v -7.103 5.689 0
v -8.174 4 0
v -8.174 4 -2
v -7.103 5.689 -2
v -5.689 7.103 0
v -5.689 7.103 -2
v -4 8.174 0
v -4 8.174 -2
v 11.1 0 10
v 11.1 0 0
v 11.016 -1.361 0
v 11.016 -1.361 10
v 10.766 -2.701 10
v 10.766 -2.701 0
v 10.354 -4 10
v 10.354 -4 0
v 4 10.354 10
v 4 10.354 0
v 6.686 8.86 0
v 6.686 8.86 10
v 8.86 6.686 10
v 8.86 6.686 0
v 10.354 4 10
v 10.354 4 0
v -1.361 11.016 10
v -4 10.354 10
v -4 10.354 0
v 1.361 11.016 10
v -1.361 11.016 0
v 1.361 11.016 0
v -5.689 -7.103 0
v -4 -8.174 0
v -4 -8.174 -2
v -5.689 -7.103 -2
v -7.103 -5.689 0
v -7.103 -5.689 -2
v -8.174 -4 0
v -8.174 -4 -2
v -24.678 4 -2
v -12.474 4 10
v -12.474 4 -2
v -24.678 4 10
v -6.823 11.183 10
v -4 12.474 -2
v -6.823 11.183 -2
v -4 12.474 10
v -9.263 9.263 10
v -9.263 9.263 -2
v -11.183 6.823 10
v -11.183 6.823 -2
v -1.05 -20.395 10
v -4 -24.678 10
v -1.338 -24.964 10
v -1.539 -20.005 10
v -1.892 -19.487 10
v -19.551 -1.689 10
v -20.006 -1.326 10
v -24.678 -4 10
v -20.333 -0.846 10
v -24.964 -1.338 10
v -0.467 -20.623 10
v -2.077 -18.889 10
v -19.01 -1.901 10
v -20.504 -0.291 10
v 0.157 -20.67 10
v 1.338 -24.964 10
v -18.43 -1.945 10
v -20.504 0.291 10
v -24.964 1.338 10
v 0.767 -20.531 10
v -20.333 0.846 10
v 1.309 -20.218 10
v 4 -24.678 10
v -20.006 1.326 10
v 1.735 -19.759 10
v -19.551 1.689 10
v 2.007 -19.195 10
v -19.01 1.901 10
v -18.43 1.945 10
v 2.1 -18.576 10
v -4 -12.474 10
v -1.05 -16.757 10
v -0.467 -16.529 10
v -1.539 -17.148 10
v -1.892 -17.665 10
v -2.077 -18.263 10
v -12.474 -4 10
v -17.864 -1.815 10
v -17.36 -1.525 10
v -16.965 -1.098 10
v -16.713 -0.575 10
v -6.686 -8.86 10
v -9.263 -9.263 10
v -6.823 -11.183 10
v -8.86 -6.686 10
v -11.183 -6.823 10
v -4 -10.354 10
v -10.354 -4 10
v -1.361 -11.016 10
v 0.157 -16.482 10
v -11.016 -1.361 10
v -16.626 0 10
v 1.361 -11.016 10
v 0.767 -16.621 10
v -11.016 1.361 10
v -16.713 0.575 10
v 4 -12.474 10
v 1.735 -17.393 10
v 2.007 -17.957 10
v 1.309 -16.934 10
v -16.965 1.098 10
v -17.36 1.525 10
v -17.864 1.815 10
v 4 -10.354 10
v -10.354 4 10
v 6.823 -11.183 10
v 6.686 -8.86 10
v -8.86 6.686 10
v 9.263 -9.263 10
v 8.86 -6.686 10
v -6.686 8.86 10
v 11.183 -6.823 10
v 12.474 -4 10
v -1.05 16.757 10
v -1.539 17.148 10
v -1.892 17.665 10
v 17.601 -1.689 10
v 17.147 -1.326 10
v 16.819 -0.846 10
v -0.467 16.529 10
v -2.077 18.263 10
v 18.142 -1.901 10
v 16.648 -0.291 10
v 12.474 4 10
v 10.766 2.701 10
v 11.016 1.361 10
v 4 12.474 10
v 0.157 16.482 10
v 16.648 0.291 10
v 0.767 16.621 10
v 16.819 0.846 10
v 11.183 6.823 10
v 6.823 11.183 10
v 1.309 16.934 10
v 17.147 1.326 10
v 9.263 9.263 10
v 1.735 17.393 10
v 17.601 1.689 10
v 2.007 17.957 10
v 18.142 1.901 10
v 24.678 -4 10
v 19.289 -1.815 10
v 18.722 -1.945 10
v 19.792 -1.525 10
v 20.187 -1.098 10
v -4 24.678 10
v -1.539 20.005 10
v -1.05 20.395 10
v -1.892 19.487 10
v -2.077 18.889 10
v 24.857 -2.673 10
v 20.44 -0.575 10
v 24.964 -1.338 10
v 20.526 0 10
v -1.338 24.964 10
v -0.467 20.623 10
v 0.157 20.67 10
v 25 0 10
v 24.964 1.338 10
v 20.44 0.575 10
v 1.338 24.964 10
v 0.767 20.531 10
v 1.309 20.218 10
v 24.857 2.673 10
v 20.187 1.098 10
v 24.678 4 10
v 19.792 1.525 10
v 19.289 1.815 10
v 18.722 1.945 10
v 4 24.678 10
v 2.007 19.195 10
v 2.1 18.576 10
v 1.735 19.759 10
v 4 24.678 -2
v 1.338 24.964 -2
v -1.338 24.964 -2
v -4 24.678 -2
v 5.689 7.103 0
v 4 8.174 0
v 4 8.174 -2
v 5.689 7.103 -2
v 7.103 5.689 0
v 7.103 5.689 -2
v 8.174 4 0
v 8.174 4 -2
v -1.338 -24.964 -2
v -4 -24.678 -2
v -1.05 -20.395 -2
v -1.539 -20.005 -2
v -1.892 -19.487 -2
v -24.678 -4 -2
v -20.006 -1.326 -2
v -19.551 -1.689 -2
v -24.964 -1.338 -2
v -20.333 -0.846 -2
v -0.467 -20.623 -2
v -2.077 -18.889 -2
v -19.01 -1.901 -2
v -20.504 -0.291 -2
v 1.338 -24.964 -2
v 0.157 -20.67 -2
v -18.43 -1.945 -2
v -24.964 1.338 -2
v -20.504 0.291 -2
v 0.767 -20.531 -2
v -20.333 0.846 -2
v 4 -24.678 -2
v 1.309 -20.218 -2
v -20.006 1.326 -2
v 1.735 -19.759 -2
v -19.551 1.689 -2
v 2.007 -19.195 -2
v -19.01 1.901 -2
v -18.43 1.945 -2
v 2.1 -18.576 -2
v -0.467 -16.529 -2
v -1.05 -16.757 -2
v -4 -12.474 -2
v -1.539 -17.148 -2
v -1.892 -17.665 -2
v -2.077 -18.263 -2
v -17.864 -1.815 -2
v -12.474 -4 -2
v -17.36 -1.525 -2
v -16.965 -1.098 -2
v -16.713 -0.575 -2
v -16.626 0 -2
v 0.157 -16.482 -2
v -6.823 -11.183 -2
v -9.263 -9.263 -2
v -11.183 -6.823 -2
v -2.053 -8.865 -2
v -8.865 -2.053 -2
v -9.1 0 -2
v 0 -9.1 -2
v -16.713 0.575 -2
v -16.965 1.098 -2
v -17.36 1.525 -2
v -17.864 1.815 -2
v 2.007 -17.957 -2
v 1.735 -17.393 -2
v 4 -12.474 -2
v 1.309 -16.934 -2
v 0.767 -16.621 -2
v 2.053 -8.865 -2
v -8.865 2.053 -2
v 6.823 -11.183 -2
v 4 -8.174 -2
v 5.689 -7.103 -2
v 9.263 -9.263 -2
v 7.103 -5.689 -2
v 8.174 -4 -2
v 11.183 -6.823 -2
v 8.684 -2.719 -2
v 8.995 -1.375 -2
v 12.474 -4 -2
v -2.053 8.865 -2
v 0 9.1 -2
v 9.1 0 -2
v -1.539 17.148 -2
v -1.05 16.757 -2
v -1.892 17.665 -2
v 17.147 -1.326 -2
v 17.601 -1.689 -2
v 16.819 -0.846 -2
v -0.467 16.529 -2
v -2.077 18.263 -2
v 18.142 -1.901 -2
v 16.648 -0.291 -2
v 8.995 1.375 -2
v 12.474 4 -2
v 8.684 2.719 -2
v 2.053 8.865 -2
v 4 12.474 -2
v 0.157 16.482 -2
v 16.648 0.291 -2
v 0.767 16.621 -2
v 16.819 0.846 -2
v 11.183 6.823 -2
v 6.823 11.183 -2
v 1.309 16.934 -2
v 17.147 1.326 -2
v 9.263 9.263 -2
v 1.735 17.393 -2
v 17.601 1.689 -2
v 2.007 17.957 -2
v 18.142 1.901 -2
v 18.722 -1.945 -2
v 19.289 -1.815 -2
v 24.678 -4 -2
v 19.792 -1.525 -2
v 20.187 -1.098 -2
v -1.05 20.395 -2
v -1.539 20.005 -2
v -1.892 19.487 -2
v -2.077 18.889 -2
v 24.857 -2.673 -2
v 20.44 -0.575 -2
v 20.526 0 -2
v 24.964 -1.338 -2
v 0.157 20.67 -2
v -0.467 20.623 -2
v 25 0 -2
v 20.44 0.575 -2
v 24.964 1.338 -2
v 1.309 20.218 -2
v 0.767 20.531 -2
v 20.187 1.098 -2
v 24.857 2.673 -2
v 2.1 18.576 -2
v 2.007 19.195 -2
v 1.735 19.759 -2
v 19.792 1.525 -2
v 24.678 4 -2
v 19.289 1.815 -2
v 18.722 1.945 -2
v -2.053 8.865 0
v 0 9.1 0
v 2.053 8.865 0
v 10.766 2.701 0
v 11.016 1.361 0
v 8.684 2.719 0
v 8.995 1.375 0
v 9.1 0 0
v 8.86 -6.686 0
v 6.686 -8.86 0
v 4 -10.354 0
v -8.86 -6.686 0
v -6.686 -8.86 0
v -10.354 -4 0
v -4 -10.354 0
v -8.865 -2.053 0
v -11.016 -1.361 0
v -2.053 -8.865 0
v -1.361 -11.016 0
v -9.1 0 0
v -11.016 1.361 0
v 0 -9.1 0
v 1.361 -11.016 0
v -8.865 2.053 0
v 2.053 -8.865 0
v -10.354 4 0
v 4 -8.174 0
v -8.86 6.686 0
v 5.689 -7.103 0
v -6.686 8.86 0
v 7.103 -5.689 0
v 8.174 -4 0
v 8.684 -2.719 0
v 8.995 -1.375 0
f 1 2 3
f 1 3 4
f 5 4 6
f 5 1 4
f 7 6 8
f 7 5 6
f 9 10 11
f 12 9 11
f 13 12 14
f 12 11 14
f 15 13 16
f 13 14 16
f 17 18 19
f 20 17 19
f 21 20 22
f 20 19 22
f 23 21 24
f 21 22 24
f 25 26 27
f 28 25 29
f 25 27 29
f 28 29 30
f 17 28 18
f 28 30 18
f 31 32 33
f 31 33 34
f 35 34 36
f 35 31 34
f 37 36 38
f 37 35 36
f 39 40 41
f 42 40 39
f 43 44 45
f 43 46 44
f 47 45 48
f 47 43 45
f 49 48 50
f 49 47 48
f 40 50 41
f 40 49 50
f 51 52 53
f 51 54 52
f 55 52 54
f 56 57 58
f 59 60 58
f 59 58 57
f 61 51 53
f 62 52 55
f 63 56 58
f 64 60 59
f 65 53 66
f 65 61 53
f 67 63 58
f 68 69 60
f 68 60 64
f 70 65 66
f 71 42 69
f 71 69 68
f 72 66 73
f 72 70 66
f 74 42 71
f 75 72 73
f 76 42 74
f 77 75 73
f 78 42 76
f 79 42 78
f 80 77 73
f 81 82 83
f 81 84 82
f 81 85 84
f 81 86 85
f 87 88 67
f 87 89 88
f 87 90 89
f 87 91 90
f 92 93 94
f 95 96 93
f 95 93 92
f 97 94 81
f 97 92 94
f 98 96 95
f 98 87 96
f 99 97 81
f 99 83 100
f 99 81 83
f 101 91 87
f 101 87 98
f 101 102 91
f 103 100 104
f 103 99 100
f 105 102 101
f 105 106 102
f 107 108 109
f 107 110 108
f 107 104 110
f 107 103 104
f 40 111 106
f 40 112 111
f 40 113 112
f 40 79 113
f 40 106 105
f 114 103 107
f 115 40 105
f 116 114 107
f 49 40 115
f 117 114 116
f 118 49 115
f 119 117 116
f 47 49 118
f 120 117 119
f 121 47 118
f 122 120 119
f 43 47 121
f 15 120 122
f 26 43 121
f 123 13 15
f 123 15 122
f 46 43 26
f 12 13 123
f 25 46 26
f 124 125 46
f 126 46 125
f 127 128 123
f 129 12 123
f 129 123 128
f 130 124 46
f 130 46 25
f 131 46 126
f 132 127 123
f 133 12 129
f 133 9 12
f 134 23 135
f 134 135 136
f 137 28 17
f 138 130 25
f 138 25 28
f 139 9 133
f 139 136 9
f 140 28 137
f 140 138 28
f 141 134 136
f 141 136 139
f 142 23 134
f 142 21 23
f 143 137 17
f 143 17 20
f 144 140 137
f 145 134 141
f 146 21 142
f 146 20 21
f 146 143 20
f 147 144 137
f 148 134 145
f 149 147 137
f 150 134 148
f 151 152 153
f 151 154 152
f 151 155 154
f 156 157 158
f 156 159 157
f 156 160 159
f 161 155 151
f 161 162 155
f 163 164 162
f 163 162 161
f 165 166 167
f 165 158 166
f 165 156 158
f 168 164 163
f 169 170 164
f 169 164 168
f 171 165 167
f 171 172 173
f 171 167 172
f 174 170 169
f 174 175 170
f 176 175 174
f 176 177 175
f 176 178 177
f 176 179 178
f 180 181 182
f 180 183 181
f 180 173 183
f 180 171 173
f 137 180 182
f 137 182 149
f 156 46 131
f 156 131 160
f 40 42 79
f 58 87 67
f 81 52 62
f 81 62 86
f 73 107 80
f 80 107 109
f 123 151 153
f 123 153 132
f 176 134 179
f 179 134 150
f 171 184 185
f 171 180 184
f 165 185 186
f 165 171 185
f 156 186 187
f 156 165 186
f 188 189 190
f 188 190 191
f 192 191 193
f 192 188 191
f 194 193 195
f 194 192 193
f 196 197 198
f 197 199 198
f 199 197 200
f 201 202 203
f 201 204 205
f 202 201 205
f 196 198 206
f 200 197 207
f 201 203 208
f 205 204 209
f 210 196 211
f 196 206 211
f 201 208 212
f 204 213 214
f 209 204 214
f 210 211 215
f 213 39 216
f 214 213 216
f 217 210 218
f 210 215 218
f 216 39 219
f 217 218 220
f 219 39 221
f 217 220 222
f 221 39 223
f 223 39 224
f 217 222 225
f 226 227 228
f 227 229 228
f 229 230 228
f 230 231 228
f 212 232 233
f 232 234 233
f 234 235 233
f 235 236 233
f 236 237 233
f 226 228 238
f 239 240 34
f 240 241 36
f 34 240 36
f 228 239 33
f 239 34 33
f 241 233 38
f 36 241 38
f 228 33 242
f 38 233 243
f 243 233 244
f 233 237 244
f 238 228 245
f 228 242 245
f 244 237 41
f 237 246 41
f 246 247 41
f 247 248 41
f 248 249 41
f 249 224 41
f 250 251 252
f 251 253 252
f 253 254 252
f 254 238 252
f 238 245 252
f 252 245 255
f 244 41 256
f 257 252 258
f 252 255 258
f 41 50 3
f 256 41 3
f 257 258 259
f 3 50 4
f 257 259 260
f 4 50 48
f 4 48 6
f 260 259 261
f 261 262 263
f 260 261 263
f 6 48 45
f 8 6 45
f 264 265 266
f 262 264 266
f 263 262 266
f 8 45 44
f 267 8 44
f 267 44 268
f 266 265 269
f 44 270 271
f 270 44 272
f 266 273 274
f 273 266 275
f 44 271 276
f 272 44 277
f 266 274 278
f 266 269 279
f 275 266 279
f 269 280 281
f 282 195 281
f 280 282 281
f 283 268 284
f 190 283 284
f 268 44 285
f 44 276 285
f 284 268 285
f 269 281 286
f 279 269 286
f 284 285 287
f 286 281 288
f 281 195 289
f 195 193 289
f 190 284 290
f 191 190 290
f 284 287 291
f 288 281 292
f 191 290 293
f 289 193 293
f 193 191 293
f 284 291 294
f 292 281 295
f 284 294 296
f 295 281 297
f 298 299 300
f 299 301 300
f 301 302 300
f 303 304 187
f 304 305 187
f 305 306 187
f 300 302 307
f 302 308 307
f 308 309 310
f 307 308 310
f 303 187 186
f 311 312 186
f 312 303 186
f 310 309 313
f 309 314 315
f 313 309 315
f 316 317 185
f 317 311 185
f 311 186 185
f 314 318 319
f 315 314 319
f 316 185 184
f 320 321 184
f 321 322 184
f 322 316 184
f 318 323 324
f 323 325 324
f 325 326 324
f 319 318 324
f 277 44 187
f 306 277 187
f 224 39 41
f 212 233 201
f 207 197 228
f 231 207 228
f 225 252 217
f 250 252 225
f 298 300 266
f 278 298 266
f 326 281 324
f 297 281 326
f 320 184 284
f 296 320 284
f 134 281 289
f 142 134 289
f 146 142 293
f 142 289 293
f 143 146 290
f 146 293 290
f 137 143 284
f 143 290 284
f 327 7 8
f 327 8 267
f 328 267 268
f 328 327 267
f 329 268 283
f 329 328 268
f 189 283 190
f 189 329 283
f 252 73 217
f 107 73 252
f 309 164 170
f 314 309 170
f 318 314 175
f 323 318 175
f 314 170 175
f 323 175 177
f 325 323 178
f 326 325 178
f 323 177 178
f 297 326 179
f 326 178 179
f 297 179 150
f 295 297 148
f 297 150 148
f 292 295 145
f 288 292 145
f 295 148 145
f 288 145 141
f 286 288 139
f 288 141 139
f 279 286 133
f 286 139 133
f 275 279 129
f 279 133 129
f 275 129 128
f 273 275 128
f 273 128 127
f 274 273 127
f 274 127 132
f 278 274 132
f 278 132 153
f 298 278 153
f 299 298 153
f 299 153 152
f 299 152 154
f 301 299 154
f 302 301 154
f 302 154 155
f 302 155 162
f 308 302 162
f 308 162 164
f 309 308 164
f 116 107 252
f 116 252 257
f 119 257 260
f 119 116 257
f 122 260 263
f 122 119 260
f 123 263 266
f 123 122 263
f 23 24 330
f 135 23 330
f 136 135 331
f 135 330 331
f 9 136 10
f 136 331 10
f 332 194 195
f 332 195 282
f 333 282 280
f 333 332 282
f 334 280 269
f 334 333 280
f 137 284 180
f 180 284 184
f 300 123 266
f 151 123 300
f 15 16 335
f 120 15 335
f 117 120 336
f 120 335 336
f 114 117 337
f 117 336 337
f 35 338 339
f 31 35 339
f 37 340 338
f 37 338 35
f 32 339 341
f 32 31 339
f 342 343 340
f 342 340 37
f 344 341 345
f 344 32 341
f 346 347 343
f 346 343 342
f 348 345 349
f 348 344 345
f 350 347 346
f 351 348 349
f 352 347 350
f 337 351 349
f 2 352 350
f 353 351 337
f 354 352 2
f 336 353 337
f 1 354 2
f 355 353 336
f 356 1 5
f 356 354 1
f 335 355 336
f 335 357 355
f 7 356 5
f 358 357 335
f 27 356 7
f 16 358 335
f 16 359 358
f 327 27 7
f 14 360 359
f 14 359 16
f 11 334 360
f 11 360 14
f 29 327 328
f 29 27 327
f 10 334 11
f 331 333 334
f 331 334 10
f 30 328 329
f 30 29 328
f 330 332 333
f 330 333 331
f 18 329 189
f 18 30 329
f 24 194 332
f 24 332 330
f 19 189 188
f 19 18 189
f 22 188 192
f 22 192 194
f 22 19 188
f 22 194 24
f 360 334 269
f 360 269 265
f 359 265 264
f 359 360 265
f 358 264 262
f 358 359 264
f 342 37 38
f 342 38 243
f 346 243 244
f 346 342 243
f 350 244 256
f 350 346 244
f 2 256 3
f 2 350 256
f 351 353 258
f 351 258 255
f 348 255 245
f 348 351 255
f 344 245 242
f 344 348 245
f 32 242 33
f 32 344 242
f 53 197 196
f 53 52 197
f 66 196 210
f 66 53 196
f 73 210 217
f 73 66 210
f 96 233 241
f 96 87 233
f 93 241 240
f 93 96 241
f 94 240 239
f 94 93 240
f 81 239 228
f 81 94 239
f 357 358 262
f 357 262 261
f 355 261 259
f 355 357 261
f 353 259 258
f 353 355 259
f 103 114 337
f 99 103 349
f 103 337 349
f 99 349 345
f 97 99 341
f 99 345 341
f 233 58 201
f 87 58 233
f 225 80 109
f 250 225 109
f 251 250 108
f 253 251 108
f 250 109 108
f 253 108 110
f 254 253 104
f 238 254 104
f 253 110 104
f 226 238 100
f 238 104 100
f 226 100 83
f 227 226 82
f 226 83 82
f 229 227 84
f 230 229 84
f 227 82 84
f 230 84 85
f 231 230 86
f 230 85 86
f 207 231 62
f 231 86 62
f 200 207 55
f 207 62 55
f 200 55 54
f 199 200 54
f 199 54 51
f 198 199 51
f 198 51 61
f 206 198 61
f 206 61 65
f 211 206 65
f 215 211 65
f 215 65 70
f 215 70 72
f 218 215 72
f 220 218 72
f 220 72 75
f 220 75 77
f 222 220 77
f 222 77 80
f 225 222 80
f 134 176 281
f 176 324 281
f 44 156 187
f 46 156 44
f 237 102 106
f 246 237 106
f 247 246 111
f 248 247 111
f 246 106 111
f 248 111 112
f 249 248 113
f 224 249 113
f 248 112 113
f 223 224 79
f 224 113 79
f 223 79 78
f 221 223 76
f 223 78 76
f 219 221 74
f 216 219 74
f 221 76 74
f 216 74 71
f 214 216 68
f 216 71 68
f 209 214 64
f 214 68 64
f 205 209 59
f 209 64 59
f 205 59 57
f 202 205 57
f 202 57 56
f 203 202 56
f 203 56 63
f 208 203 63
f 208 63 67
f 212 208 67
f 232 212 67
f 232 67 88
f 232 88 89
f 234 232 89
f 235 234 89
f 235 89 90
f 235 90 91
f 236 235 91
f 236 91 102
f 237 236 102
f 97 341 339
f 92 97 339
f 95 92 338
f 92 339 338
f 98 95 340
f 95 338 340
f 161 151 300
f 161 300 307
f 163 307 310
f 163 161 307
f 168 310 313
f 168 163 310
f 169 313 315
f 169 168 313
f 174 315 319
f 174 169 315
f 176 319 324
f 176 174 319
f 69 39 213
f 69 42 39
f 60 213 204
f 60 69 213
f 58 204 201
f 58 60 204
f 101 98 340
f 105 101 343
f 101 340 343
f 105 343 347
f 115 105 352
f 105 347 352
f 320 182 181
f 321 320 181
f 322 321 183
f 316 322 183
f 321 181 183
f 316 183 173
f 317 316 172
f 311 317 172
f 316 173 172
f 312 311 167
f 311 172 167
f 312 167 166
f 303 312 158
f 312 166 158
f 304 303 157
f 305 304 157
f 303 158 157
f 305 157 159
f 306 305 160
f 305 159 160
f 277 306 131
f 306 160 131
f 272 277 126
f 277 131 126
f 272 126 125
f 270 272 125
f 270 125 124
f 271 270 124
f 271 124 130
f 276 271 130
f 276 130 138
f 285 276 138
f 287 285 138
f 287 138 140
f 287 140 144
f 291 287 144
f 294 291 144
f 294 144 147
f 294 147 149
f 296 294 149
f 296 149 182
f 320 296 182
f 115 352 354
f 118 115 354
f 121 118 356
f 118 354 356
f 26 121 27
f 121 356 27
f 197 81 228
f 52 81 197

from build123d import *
from build123d import SkipClean  # not in build123d's __all__

# Parameters (mm, degrees)
F1_DEPTH = 2
F2_DEPTH = 10
F3_R     = 1.95
F3_R_2   = 2.1
F4_DEPTH = 12.001


# Not quite as in the source:
# - after a boolean that leaves OpenCascade's solid faulty, fix() repairs it


with BuildPart() as f1:
    # F0 (on Top) → F1 (new body)
    with BuildSketch(Plane.XY):
        with BuildLine():
            ThreePointArc((-4, 12.4743737318), (0, 13.1), (4, 12.4743737318))
            Line((4, 12.4743737318), (4, 24.6779253585))
            Line((4, 24.6779253585), (-4, 24.6779253585))
            Line((-4, 24.6779253585), (-4, 12.4743737318))
        make_face()
        with BuildLine():
            Line((-4, 24.6779253585), (4, 24.6779253585))
            ThreePointArc((4, 24.6779253585), (0, 25), (-4, 24.6779253585))
        make_face()
        with BuildLine():
            ThreePointArc((25, 0), (24.9193512552, 2.0064727804), (24.6779253585, 4))
            Line((24.6779253585, 4), (24.6779253585, -4))
            ThreePointArc((24.6779253585, -4), (24.9193512552, -2.0064727804), (25, 0))
        make_face()
        with BuildLine():
            Line((24.6779253585, 4), (12.4743737318, 4))
            ThreePointArc((12.4743737318, 4), (12.942648413, 2.0243152069), (13.1, 0))
            ThreePointArc((13.1, 0), (12.942648413, -2.0243152069), (12.4743737318, -4))
            Line((12.4743737318, -4), (24.6779253585, -4))
            Line((24.6779253585, -4), (24.6779253585, 4))
        make_face()
        with BuildLine():
            ThreePointArc((-4, -24.6779253585), (0, -25), (4, -24.6779253585))
            Line((4, -24.6779253585), (-4, -24.6779253585))
        make_face()
        with BuildLine():
            Line((-24.6779253585, -4), (-24.6779253585, 4))
            ThreePointArc((-24.6779253585, 4), (-25, 0), (-24.6779253585, -4))
        make_face()
        with BuildLine():
            ThreePointArc((-12.4743737318, -4), (-13.1, 0), (-12.4743737318, 4))
            Line((-12.4743737318, 4), (-24.6779253585, 4))
            Line((-24.6779253585, 4), (-24.6779253585, -4))
            Line((-24.6779253585, -4), (-12.4743737318, -4))
        make_face()
        with BuildLine():
            Line((4, -24.6779253585), (4, -12.4743737318))
            ThreePointArc((4, -12.4743737318), (0, -13.1), (-4, -12.4743737318))
            Line((-4, -12.4743737318), (-4, -24.6779253585))
            Line((-4, -24.6779253585), (4, -24.6779253585))
        make_face()
        with BuildLine():
            Line((-4, -12.4743737318), (-4, -10.3542261903))
            ThreePointArc((-4, -10.3542261903), (-7.8488852712, -7.8488852712), (-10.3542261903, -4))
            Line((-10.3542261903, -4), (-12.4743737318, -4))
            ThreePointArc((-12.4743737318, -4), (-9.2630988335, -9.2630988335), (-4, -12.4743737318))
        make_face()
        with BuildLine():
            ThreePointArc((-10.3542261903, -4), (-7.8488852712, -7.8488852712), (-4, -10.3542261903))
            Line((-4, -10.3542261903), (-4, -8.1737384348))
            ThreePointArc((-4, -8.1737384348), (-6.4346717088, -6.4346717088), (-8.1737384348, -4))
            Line((-8.1737384348, -4), (-10.3542261903, -4))
        make_face()
        with BuildLine():
            Line((-8.1737384348, 4), (-10.3542261903, 4))
            ThreePointArc((-10.3542261903, 4), (-11.1, 0), (-10.3542261903, -4))
            Line((-10.3542261903, -4), (-8.1737384348, -4))
            ThreePointArc((-8.1737384348, -4), (-9.1, 0), (-8.1737384348, 4))
        make_face()
        with BuildLine():
            ThreePointArc((-10.3542261903, -4), (-11.1, 0), (-10.3542261903, 4))
            Line((-10.3542261903, 4), (-12.4743737318, 4))
            ThreePointArc((-12.4743737318, 4), (-13.1, 0), (-12.4743737318, -4))
            Line((-12.4743737318, -4), (-10.3542261903, -4))
        make_face()
        with BuildLine():
            ThreePointArc((-10.3542261903, 4), (-7.8488852712, 7.8488852712), (-4, 10.3542261903))
            Line((-4, 10.3542261903), (-4, 12.4743737318))
            ThreePointArc((-4, 12.4743737318), (-9.2630988335, 9.2630988335), (-12.4743737318, 4))
            Line((-12.4743737318, 4), (-10.3542261903, 4))
        make_face()
        with BuildLine():
            Line((-4, 8.1737384348), (-4, 10.3542261903))
            ThreePointArc((-4, 10.3542261903), (-7.8488852712, 7.8488852712), (-10.3542261903, 4))
            Line((-10.3542261903, 4), (-8.1737384348, 4))
            ThreePointArc((-8.1737384348, 4), (-6.4346717088, 6.4346717088), (-4, 8.1737384348))
        make_face()
        with BuildLine():
            Line((4, 8.1737384348), (4, 10.3542261903))
            ThreePointArc((4, 10.3542261903), (0, 11.1), (-4, 10.3542261903))
            Line((-4, 10.3542261903), (-4, 8.1737384348))
            ThreePointArc((-4, 8.1737384348), (0, 9.1), (4, 8.1737384348))
        make_face()
        with BuildLine():
            ThreePointArc((-4, 10.3542261903), (0, 11.1), (4, 10.3542261903))
            Line((4, 10.3542261903), (4, 12.4743737318))
            ThreePointArc((4, 12.4743737318), (0, 13.1), (-4, 12.4743737318))
            Line((-4, 12.4743737318), (-4, 10.3542261903))
        make_face()
        with BuildLine():
            ThreePointArc((4, 10.3542261903), (7.8488852712, 7.8488852712), (10.3542261903, 4))
            Line((10.3542261903, 4), (12.4743737318, 4))
            ThreePointArc((12.4743737318, 4), (9.2630988335, 9.2630988335), (4, 12.4743737318))
            Line((4, 12.4743737318), (4, 10.3542261903))
        make_face()
        with BuildLine():
            Line((8.1737384348, 4), (10.3542261903, 4))
            ThreePointArc((10.3542261903, 4), (7.8488852712, 7.8488852712), (4, 10.3542261903))
            Line((4, 10.3542261903), (4, 8.1737384348))
            ThreePointArc((4, 8.1737384348), (6.4346717088, 6.4346717088), (8.1737384348, 4))
        make_face()
        with BuildLine():
            ThreePointArc((10.3542261903, 4), (10.9119638634, 2.0344642154), (11.1, 0))
            ThreePointArc((11.1, 0), (10.9119638634, -2.0344642154), (10.3542261903, -4))
            Line((10.3542261903, -4), (12.4743737318, -4))
            ThreePointArc((12.4743737318, -4), (12.942648413, -2.0243152069), (13.1, 0))
            ThreePointArc((13.1, 0), (12.942648413, 2.0243152069), (12.4743737318, 4))
            Line((12.4743737318, 4), (10.3542261903, 4))
        make_face()
        with BuildLine():
            ThreePointArc((10.3542261903, -4), (10.9119638634, -2.0344642154), (11.1, 0))
            ThreePointArc((11.1, 0), (10.9119638634, 2.0344642154), (10.3542261903, 4))
            Line((10.3542261903, 4), (8.1737384348, 4))
            ThreePointArc((8.1737384348, 4), (8.8654108691, 2.052922337), (9.1, 0))
            ThreePointArc((9.1, 0), (8.8654108691, -2.052922337), (8.1737384348, -4))
            Line((8.1737384348, -4), (10.3542261903, -4))
        make_face()
        with BuildLine():
            Line((12.4743737318, -4), (10.3542261903, -4))
            ThreePointArc((10.3542261903, -4), (7.8488852712, -7.8488852712), (4, -10.3542261903))
            Line((4, -10.3542261903), (4, -12.4743737318))
            ThreePointArc((4, -12.4743737318), (9.2630988335, -9.2630988335), (12.4743737318, -4))
        make_face()
        with BuildLine():
            ThreePointArc((4, -10.3542261903), (7.8488852712, -7.8488852712), (10.3542261903, -4))
            Line((10.3542261903, -4), (8.1737384348, -4))
            ThreePointArc((8.1737384348, -4), (6.4346717088, -6.4346717088), (4, -8.1737384348))
            Line((4, -8.1737384348), (4, -10.3542261903))
        make_face()
        with BuildLine():
            ThreePointArc((-4, -10.3542261903), (0, -11.1), (4, -10.3542261903))
            Line((4, -10.3542261903), (4, -8.1737384348))
            ThreePointArc((4, -8.1737384348), (0, -9.1), (-4, -8.1737384348))
            Line((-4, -8.1737384348), (-4, -10.3542261903))
        make_face()
        with BuildLine():
            Line((4, -12.4743737318), (4, -10.3542261903))
            ThreePointArc((4, -10.3542261903), (0, -11.1), (-4, -10.3542261903))
            Line((-4, -10.3542261903), (-4, -12.4743737318))
            ThreePointArc((-4, -12.4743737318), (0, -13.1), (4, -12.4743737318))
        make_face()
    extrude(amount=-F1_DEPTH)

    # F0 (on Top) → F2 (join)
    with BuildSketch(Plane.XY):
        with BuildLine():
            ThreePointArc((-4, 10.3542261903), (0, 11.1), (4, 10.3542261903))
            Line((4, 10.3542261903), (4, 12.4743737318))
            ThreePointArc((4, 12.4743737318), (0, 13.1), (-4, 12.4743737318))
            Line((-4, 12.4743737318), (-4, 10.3542261903))
        make_face()
        with BuildLine():
            ThreePointArc((4, 10.3542261903), (7.8488852712, 7.8488852712), (10.3542261903, 4))
            Line((10.3542261903, 4), (12.4743737318, 4))
            ThreePointArc((12.4743737318, 4), (9.2630988335, 9.2630988335), (4, 12.4743737318))
            Line((4, 12.4743737318), (4, 10.3542261903))
        make_face()
        with BuildLine():
            ThreePointArc((-4, 12.4743737318), (0, 13.1), (4, 12.4743737318))
            Line((4, 12.4743737318), (4, 24.6779253585))
            Line((4, 24.6779253585), (-4, 24.6779253585))
            Line((-4, 24.6779253585), (-4, 12.4743737318))
        make_face()
        with BuildLine():
            ThreePointArc((-10.3542261903, 4), (-7.8488852712, 7.8488852712), (-4, 10.3542261903))
            Line((-4, 10.3542261903), (-4, 12.4743737318))
            ThreePointArc((-4, 12.4743737318), (-9.2630988335, 9.2630988335), (-12.4743737318, 4))
            Line((-12.4743737318, 4), (-10.3542261903, 4))
        make_face()
        with BuildLine():
            ThreePointArc((-10.3542261903, -4), (-11.1, 0), (-10.3542261903, 4))
            Line((-10.3542261903, 4), (-12.4743737318, 4))
            ThreePointArc((-12.4743737318, 4), (-13.1, 0), (-12.4743737318, -4))
            Line((-12.4743737318, -4), (-10.3542261903, -4))
        make_face()
        with BuildLine():
            ThreePointArc((-12.4743737318, -4), (-13.1, 0), (-12.4743737318, 4))
            Line((-12.4743737318, 4), (-24.6779253585, 4))
            Line((-24.6779253585, 4), (-24.6779253585, -4))
            Line((-24.6779253585, -4), (-12.4743737318, -4))
        make_face()
        with BuildLine():
            Line((-4, -12.4743737318), (-4, -10.3542261903))
            ThreePointArc((-4, -10.3542261903), (-7.8488852712, -7.8488852712), (-10.3542261903, -4))
            Line((-10.3542261903, -4), (-12.4743737318, -4))
            ThreePointArc((-12.4743737318, -4), (-9.2630988335, -9.2630988335), (-4, -12.4743737318))
        make_face()
        with BuildLine():
            Line((4, -12.4743737318), (4, -10.3542261903))
            ThreePointArc((4, -10.3542261903), (0, -11.1), (-4, -10.3542261903))
            Line((-4, -10.3542261903), (-4, -12.4743737318))
            ThreePointArc((-4, -12.4743737318), (0, -13.1), (4, -12.4743737318))
        make_face()
        with BuildLine():
            Line((4, -24.6779253585), (4, -12.4743737318))
            ThreePointArc((4, -12.4743737318), (0, -13.1), (-4, -12.4743737318))
            Line((-4, -12.4743737318), (-4, -24.6779253585))
            Line((-4, -24.6779253585), (4, -24.6779253585))
        make_face()
        with BuildLine():
            Line((12.4743737318, -4), (10.3542261903, -4))
            ThreePointArc((10.3542261903, -4), (7.8488852712, -7.8488852712), (4, -10.3542261903))
            Line((4, -10.3542261903), (4, -12.4743737318))
            ThreePointArc((4, -12.4743737318), (9.2630988335, -9.2630988335), (12.4743737318, -4))
        make_face()
        with BuildLine():
            ThreePointArc((10.3542261903, 4), (10.9119638634, 2.0344642154), (11.1, 0))
            ThreePointArc((11.1, 0), (10.9119638634, -2.0344642154), (10.3542261903, -4))
            Line((10.3542261903, -4), (12.4743737318, -4))
            ThreePointArc((12.4743737318, -4), (12.942648413, -2.0243152069), (13.1, 0))
            ThreePointArc((13.1, 0), (12.942648413, 2.0243152069), (12.4743737318, 4))
            Line((12.4743737318, 4), (10.3542261903, 4))
        make_face()
        with BuildLine():
            Line((24.6779253585, 4), (12.4743737318, 4))
            ThreePointArc((12.4743737318, 4), (12.942648413, 2.0243152069), (13.1, 0))
            ThreePointArc((13.1, 0), (12.942648413, -2.0243152069), (12.4743737318, -4))
            Line((12.4743737318, -4), (24.6779253585, -4))
            Line((24.6779253585, -4), (24.6779253585, 4))
        make_face()
        with BuildLine():
            ThreePointArc((25, 0), (24.9193512552, 2.0064727804), (24.6779253585, 4))
            Line((24.6779253585, 4), (24.6779253585, -4))
            ThreePointArc((24.6779253585, -4), (24.9193512552, -2.0064727804), (25, 0))
        make_face()
        with BuildLine():
            ThreePointArc((-4, -24.6779253585), (0, -25), (4, -24.6779253585))
            Line((4, -24.6779253585), (-4, -24.6779253585))
        make_face()
        with BuildLine():
            Line((-24.6779253585, -4), (-24.6779253585, 4))
            ThreePointArc((-24.6779253585, 4), (-25, 0), (-24.6779253585, -4))
        make_face()
        with BuildLine():
            Line((-4, 24.6779253585), (4, 24.6779253585))
            ThreePointArc((4, 24.6779253585), (0, 25), (-4, 24.6779253585))
        make_face()
    with SkipClean():  # cleaning this boolean's faces spoils the solid; the shape is the same uncleaned
        extrude(amount=F2_DEPTH)

    # F3 (on face) → F4 (cut, through all)
    with BuildSketch(Plane.XY.offset(10)):
        with Locations((18.5761495451, 0)):
            Circle(F3_R)
        with Locations((0, 18.5761495451)):
            Circle(F3_R_2)
        with Locations((0, -18.5761495451)):
            Circle(F3_R_2)
        with Locations((-18.5761495451, 0)):
            Circle(F3_R)
    extrude(amount=-F4_DEPTH, mode=Mode.SUBTRACT)

    add(f1.part.fix(), mode=Mode.REPLACE)


solid = f1.part
